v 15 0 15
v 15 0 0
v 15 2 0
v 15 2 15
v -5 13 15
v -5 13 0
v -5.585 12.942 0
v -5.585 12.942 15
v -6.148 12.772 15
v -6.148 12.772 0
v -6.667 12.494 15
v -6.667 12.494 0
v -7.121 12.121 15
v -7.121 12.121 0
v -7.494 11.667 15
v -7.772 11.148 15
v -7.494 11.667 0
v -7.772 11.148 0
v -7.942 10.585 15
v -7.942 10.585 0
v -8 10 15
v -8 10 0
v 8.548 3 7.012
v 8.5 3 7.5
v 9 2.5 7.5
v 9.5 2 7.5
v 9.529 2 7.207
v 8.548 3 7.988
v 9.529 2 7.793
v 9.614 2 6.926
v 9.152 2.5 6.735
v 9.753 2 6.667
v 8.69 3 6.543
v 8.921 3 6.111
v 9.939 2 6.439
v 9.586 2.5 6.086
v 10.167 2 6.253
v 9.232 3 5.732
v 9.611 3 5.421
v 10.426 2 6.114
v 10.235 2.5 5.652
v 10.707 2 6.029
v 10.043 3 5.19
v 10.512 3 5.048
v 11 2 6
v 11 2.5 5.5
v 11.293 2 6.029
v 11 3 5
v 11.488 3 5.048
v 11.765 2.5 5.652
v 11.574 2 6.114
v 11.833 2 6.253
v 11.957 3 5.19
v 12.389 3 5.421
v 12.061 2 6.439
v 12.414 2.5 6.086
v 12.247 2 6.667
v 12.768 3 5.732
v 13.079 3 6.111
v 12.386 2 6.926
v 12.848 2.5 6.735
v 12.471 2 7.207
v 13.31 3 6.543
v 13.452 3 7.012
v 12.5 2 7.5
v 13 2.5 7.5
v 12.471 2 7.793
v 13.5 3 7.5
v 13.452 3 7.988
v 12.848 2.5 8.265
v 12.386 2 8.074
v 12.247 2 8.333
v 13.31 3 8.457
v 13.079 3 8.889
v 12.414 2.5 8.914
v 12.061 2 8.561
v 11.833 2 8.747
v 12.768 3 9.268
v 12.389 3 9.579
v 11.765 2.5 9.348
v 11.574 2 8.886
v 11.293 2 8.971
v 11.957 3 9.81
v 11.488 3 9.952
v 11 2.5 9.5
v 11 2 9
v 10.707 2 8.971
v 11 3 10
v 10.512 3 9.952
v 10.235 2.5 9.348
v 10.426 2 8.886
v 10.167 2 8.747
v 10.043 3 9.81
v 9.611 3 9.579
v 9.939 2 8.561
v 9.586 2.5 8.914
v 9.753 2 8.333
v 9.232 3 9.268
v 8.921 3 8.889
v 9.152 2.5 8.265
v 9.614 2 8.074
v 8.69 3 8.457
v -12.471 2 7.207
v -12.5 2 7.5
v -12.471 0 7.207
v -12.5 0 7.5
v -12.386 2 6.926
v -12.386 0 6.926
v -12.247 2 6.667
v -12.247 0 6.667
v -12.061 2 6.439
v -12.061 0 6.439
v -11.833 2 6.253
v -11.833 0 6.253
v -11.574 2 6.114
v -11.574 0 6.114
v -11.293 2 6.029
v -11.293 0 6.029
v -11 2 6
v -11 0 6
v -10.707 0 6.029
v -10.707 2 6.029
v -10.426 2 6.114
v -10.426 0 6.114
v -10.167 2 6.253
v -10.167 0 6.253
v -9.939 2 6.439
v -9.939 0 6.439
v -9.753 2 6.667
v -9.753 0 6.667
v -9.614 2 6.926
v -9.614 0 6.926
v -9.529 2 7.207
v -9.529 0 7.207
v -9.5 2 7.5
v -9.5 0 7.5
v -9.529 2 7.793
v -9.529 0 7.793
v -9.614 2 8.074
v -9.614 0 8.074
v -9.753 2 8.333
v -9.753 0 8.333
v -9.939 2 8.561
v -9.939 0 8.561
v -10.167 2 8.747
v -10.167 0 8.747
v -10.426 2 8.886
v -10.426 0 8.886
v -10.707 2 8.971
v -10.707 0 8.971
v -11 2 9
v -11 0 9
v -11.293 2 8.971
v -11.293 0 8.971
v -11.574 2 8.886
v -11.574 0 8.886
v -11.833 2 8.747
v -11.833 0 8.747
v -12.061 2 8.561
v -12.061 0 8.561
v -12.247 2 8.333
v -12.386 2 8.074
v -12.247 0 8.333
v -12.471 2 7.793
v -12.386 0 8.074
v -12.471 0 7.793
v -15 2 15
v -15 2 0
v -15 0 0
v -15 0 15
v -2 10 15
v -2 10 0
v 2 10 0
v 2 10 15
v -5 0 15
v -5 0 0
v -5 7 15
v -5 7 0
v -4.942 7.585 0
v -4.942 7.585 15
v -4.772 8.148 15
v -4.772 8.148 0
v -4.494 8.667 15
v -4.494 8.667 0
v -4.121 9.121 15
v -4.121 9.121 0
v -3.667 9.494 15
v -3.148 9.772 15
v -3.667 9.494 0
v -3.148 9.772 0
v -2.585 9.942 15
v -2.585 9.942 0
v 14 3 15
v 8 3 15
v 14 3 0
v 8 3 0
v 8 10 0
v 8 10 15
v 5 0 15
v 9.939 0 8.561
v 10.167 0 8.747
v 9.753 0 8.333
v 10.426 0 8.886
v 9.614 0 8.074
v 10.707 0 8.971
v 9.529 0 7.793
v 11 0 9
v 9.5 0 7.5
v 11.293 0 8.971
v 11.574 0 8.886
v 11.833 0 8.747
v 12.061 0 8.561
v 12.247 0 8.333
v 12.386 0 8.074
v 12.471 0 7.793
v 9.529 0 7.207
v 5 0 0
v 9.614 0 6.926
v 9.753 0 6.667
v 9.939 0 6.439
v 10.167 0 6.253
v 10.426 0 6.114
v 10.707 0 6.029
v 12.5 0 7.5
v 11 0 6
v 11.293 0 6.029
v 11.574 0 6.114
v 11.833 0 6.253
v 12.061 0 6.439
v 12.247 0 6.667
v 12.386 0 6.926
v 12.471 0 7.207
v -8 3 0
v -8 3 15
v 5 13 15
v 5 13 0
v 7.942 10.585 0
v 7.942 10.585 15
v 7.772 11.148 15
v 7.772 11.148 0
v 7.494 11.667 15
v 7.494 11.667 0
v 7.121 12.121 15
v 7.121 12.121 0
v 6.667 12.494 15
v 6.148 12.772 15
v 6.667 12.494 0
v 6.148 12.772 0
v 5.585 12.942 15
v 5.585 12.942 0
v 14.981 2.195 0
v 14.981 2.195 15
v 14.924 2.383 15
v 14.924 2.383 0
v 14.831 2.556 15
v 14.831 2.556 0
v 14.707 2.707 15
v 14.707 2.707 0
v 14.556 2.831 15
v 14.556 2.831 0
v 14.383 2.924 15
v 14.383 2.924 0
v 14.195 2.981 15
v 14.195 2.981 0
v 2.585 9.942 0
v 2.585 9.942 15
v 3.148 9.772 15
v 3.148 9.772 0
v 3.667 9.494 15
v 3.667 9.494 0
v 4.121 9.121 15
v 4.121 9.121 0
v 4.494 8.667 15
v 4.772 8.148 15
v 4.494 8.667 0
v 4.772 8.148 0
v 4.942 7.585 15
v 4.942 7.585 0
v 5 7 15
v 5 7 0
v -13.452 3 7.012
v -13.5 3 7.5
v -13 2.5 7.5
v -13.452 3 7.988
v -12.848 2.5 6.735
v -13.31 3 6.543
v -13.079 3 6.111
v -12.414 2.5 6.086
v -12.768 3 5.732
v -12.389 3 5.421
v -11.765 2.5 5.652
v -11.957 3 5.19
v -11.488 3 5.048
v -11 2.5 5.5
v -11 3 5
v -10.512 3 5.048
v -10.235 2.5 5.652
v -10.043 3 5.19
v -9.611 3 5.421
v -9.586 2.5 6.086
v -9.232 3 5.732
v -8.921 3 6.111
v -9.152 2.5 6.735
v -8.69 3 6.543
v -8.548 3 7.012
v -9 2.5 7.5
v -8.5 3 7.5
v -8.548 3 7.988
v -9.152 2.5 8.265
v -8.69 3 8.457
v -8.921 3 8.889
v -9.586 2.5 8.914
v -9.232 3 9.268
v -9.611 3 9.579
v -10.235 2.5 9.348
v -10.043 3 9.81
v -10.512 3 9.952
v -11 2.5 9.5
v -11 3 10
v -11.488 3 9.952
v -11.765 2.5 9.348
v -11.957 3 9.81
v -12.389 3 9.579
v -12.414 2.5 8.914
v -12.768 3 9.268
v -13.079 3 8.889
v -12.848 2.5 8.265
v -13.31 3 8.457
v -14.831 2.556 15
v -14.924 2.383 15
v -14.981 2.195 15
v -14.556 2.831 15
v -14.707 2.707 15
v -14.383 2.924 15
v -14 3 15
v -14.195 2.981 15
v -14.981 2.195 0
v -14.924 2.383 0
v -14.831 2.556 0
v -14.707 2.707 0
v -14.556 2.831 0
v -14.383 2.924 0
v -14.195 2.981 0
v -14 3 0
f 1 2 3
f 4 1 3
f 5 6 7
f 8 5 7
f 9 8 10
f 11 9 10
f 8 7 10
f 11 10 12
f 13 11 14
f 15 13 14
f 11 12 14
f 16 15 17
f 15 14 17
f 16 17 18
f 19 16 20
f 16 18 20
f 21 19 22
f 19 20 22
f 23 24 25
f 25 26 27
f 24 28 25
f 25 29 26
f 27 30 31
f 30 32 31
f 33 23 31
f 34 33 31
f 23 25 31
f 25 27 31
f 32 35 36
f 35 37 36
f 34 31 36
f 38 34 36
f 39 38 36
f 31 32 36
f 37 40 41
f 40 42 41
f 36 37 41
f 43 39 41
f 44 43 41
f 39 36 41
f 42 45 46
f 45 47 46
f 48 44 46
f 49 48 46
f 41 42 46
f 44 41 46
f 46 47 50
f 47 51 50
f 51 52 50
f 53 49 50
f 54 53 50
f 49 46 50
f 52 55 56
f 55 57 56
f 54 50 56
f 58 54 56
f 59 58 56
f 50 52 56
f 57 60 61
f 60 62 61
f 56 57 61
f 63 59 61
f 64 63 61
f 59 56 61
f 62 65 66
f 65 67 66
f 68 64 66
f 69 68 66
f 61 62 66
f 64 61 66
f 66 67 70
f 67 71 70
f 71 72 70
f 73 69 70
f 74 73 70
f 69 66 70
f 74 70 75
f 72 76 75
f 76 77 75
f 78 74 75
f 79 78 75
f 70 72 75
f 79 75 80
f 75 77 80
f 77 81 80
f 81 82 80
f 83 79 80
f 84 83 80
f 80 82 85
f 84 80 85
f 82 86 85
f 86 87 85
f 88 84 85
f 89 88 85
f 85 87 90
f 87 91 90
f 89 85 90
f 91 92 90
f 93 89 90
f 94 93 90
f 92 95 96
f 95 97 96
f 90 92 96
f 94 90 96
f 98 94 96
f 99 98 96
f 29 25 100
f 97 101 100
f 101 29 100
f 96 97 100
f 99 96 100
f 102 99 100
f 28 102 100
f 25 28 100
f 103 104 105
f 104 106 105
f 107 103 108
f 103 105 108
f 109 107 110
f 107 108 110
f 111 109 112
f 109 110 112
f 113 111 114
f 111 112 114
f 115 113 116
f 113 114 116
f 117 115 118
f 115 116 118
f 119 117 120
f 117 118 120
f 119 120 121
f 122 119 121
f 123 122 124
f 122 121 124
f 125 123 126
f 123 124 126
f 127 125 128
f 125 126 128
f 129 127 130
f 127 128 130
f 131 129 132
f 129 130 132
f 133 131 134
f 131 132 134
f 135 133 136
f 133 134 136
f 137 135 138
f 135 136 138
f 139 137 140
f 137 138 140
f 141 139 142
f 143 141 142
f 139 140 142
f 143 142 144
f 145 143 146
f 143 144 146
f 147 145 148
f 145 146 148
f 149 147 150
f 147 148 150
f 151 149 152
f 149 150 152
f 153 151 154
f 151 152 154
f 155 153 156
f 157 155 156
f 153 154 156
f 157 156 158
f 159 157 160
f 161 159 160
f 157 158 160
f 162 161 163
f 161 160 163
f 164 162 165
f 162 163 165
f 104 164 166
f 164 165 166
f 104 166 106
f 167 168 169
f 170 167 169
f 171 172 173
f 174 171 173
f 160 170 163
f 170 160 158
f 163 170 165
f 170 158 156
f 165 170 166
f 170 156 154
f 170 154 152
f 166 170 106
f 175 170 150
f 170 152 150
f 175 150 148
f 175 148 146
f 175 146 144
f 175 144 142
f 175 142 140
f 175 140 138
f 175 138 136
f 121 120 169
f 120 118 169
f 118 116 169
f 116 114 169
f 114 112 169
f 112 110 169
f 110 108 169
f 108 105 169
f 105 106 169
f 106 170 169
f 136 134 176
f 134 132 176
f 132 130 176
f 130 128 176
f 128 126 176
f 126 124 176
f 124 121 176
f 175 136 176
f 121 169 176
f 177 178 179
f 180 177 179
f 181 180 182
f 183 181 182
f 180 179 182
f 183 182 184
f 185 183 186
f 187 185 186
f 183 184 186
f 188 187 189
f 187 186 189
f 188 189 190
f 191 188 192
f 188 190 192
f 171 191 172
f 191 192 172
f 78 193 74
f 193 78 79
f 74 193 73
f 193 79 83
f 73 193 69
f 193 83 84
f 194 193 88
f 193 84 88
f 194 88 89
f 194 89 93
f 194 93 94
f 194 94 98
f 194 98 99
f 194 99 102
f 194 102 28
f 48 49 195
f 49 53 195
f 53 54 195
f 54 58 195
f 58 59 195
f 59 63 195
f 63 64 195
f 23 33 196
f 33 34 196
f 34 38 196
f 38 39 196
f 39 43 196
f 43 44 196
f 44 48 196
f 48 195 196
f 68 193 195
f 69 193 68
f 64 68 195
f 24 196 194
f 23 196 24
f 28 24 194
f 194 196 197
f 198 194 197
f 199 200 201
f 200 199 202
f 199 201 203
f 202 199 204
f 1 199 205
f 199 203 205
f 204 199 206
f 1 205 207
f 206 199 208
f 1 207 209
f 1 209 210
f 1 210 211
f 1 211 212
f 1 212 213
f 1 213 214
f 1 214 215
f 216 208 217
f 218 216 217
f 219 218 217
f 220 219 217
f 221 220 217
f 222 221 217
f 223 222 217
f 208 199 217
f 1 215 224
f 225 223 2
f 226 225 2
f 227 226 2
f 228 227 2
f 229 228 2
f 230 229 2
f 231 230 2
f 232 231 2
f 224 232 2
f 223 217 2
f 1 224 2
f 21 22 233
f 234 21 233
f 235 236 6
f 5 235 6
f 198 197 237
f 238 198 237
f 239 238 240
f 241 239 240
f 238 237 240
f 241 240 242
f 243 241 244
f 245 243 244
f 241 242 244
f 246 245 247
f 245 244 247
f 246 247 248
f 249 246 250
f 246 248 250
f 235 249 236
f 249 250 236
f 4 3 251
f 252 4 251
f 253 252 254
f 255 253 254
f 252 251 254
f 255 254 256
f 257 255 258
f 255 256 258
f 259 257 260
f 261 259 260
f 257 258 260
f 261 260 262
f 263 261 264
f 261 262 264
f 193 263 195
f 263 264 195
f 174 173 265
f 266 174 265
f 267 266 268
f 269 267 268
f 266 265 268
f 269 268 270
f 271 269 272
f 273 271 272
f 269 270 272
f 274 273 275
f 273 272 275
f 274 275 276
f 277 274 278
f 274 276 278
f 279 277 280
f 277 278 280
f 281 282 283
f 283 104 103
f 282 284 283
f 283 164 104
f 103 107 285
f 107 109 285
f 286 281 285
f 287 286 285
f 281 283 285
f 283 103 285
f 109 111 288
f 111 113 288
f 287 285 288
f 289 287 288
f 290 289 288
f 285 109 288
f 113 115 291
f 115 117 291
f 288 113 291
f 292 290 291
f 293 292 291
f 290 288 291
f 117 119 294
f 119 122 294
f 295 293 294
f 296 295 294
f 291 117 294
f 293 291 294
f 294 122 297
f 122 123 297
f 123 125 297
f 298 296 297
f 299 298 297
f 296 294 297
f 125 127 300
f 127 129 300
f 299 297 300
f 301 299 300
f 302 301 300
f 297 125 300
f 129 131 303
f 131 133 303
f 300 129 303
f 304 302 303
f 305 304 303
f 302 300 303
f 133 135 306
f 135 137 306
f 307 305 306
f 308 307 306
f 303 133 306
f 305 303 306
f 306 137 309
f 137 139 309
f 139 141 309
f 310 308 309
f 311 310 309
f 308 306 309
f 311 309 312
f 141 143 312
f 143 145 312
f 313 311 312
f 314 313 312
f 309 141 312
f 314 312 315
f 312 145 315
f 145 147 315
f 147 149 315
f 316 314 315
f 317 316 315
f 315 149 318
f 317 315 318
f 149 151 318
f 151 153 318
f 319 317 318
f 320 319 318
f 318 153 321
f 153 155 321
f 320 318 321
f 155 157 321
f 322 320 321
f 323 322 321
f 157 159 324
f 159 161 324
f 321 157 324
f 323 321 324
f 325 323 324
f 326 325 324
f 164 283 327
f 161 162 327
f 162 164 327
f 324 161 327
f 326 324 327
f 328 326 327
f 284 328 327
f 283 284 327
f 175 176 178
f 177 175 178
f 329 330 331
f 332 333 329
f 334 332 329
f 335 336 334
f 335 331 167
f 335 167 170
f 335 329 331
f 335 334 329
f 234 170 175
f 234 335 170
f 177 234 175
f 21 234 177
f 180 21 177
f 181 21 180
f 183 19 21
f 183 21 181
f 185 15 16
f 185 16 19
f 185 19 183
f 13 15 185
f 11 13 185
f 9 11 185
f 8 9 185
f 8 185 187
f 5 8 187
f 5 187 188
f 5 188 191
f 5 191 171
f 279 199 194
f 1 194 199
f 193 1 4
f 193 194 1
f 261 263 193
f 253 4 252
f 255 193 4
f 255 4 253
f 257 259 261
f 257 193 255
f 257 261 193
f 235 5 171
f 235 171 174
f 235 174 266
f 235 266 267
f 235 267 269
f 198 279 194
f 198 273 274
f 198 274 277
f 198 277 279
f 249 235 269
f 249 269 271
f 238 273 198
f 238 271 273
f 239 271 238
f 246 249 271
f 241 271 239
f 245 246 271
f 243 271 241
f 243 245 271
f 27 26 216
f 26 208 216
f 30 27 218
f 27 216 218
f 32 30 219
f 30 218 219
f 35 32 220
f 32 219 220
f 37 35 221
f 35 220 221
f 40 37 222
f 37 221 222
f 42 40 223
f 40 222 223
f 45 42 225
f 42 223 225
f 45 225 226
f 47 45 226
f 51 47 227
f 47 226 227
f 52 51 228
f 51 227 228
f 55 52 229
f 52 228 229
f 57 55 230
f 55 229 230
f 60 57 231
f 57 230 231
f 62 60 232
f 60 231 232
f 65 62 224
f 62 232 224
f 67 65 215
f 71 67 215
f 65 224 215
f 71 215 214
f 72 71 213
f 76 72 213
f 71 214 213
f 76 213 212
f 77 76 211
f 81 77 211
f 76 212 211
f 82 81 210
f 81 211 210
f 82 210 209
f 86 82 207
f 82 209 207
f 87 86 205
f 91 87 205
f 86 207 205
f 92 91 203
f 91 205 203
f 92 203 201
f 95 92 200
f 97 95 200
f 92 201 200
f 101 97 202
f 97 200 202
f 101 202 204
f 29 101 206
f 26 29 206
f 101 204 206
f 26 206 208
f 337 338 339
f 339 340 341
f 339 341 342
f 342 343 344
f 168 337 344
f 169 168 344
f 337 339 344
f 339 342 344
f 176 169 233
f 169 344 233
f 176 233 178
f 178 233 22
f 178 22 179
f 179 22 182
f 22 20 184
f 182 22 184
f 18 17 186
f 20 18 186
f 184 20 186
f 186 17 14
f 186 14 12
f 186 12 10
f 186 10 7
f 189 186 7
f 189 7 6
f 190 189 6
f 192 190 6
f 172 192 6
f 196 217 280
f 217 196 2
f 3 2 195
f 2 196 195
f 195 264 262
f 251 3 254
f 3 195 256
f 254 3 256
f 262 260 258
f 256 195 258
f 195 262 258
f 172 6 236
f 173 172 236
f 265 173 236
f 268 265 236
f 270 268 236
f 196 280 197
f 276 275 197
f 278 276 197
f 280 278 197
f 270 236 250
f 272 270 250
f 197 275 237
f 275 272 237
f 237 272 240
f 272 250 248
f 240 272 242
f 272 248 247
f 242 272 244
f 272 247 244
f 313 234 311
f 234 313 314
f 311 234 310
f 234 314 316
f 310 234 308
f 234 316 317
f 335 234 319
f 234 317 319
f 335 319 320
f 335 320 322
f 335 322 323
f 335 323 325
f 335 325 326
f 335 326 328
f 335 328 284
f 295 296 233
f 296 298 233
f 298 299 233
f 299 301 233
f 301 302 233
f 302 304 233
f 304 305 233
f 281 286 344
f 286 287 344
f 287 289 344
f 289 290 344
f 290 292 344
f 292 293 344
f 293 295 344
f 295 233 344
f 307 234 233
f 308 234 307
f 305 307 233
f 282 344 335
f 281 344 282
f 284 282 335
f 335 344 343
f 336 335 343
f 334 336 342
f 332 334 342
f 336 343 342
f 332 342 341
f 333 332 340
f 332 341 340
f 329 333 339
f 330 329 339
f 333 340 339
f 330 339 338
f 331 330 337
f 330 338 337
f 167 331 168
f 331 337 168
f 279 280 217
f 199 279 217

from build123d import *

# Parameters (mm, degrees)
F1_DEPTH       = 15
F4_D           = 3
F4_DEPTH       = 3
F4_CSINK_D     = 5
F4_CSINK_ANGLE = 90
F4_TIP         = 0.9012909285


with BuildPart() as f1:
    # F0 (on Top) → F1 (new body)
    with BuildSketch(Plane.XY):
        with BuildLine():
            Line((5, 7), (5, 0))
            Line((5, 0), (15, 0))
            Line((15, 0), (15, 2))
            ThreePointArc((15, 2), (14.7071067812, 2.7071067812), (14, 3))
            Line((14, 3), (8, 3))
            Line((8, 3), (8, 10))
            ThreePointArc((8, 10), (7.1213203436, 12.1213203436), (5, 13))
            Line((5, 13), (0, 13))
            Line((0, 13), (0, 10))
            Line((0, 10), (2, 10))
            ThreePointArc((2, 10), (4.1213203436, 9.1213203436), (5, 7))
        make_face()
        with BuildLine():
            Line((-2, 10), (0, 10))
            Line((0, 10), (0, 13))
            Line((0, 13), (-5, 13))
            ThreePointArc((-5, 13), (-7.1213203436, 12.1213203436), (-8, 10))
            Line((-8, 10), (-8, 3))
            Line((-8, 3), (-14, 3))
            ThreePointArc((-14, 3), (-14.7071067812, 2.7071067812), (-15, 2))
            Line((-15, 2), (-15, 0))
            Line((-15, 0), (-5, 0))
            Line((-5, 0), (-5, 7))
            ThreePointArc((-5, 7), (-4.1213203436, 9.1213203436), (-2, 10))
        make_face()
    extrude(amount=F1_DEPTH)

    # F4
    with Locations(Plane(origin=(0, 3, 0), x_dir=(1, 0, 0), z_dir=(0, 1, 0))):
        with Locations((11, -7.5), (-11, -7.5)):
            CounterSinkHole(F4_D / 2, F4_CSINK_D / 2, depth=F4_DEPTH, counter_sink_angle=F4_CSINK_ANGLE)
            with Locations((0, 0, -(F4_DEPTH + F4_TIP / 2))):  # 118° drill point
                Cone(0, F4_D / 2, F4_TIP, mode=Mode.SUBTRACT)


solid = f1.part
